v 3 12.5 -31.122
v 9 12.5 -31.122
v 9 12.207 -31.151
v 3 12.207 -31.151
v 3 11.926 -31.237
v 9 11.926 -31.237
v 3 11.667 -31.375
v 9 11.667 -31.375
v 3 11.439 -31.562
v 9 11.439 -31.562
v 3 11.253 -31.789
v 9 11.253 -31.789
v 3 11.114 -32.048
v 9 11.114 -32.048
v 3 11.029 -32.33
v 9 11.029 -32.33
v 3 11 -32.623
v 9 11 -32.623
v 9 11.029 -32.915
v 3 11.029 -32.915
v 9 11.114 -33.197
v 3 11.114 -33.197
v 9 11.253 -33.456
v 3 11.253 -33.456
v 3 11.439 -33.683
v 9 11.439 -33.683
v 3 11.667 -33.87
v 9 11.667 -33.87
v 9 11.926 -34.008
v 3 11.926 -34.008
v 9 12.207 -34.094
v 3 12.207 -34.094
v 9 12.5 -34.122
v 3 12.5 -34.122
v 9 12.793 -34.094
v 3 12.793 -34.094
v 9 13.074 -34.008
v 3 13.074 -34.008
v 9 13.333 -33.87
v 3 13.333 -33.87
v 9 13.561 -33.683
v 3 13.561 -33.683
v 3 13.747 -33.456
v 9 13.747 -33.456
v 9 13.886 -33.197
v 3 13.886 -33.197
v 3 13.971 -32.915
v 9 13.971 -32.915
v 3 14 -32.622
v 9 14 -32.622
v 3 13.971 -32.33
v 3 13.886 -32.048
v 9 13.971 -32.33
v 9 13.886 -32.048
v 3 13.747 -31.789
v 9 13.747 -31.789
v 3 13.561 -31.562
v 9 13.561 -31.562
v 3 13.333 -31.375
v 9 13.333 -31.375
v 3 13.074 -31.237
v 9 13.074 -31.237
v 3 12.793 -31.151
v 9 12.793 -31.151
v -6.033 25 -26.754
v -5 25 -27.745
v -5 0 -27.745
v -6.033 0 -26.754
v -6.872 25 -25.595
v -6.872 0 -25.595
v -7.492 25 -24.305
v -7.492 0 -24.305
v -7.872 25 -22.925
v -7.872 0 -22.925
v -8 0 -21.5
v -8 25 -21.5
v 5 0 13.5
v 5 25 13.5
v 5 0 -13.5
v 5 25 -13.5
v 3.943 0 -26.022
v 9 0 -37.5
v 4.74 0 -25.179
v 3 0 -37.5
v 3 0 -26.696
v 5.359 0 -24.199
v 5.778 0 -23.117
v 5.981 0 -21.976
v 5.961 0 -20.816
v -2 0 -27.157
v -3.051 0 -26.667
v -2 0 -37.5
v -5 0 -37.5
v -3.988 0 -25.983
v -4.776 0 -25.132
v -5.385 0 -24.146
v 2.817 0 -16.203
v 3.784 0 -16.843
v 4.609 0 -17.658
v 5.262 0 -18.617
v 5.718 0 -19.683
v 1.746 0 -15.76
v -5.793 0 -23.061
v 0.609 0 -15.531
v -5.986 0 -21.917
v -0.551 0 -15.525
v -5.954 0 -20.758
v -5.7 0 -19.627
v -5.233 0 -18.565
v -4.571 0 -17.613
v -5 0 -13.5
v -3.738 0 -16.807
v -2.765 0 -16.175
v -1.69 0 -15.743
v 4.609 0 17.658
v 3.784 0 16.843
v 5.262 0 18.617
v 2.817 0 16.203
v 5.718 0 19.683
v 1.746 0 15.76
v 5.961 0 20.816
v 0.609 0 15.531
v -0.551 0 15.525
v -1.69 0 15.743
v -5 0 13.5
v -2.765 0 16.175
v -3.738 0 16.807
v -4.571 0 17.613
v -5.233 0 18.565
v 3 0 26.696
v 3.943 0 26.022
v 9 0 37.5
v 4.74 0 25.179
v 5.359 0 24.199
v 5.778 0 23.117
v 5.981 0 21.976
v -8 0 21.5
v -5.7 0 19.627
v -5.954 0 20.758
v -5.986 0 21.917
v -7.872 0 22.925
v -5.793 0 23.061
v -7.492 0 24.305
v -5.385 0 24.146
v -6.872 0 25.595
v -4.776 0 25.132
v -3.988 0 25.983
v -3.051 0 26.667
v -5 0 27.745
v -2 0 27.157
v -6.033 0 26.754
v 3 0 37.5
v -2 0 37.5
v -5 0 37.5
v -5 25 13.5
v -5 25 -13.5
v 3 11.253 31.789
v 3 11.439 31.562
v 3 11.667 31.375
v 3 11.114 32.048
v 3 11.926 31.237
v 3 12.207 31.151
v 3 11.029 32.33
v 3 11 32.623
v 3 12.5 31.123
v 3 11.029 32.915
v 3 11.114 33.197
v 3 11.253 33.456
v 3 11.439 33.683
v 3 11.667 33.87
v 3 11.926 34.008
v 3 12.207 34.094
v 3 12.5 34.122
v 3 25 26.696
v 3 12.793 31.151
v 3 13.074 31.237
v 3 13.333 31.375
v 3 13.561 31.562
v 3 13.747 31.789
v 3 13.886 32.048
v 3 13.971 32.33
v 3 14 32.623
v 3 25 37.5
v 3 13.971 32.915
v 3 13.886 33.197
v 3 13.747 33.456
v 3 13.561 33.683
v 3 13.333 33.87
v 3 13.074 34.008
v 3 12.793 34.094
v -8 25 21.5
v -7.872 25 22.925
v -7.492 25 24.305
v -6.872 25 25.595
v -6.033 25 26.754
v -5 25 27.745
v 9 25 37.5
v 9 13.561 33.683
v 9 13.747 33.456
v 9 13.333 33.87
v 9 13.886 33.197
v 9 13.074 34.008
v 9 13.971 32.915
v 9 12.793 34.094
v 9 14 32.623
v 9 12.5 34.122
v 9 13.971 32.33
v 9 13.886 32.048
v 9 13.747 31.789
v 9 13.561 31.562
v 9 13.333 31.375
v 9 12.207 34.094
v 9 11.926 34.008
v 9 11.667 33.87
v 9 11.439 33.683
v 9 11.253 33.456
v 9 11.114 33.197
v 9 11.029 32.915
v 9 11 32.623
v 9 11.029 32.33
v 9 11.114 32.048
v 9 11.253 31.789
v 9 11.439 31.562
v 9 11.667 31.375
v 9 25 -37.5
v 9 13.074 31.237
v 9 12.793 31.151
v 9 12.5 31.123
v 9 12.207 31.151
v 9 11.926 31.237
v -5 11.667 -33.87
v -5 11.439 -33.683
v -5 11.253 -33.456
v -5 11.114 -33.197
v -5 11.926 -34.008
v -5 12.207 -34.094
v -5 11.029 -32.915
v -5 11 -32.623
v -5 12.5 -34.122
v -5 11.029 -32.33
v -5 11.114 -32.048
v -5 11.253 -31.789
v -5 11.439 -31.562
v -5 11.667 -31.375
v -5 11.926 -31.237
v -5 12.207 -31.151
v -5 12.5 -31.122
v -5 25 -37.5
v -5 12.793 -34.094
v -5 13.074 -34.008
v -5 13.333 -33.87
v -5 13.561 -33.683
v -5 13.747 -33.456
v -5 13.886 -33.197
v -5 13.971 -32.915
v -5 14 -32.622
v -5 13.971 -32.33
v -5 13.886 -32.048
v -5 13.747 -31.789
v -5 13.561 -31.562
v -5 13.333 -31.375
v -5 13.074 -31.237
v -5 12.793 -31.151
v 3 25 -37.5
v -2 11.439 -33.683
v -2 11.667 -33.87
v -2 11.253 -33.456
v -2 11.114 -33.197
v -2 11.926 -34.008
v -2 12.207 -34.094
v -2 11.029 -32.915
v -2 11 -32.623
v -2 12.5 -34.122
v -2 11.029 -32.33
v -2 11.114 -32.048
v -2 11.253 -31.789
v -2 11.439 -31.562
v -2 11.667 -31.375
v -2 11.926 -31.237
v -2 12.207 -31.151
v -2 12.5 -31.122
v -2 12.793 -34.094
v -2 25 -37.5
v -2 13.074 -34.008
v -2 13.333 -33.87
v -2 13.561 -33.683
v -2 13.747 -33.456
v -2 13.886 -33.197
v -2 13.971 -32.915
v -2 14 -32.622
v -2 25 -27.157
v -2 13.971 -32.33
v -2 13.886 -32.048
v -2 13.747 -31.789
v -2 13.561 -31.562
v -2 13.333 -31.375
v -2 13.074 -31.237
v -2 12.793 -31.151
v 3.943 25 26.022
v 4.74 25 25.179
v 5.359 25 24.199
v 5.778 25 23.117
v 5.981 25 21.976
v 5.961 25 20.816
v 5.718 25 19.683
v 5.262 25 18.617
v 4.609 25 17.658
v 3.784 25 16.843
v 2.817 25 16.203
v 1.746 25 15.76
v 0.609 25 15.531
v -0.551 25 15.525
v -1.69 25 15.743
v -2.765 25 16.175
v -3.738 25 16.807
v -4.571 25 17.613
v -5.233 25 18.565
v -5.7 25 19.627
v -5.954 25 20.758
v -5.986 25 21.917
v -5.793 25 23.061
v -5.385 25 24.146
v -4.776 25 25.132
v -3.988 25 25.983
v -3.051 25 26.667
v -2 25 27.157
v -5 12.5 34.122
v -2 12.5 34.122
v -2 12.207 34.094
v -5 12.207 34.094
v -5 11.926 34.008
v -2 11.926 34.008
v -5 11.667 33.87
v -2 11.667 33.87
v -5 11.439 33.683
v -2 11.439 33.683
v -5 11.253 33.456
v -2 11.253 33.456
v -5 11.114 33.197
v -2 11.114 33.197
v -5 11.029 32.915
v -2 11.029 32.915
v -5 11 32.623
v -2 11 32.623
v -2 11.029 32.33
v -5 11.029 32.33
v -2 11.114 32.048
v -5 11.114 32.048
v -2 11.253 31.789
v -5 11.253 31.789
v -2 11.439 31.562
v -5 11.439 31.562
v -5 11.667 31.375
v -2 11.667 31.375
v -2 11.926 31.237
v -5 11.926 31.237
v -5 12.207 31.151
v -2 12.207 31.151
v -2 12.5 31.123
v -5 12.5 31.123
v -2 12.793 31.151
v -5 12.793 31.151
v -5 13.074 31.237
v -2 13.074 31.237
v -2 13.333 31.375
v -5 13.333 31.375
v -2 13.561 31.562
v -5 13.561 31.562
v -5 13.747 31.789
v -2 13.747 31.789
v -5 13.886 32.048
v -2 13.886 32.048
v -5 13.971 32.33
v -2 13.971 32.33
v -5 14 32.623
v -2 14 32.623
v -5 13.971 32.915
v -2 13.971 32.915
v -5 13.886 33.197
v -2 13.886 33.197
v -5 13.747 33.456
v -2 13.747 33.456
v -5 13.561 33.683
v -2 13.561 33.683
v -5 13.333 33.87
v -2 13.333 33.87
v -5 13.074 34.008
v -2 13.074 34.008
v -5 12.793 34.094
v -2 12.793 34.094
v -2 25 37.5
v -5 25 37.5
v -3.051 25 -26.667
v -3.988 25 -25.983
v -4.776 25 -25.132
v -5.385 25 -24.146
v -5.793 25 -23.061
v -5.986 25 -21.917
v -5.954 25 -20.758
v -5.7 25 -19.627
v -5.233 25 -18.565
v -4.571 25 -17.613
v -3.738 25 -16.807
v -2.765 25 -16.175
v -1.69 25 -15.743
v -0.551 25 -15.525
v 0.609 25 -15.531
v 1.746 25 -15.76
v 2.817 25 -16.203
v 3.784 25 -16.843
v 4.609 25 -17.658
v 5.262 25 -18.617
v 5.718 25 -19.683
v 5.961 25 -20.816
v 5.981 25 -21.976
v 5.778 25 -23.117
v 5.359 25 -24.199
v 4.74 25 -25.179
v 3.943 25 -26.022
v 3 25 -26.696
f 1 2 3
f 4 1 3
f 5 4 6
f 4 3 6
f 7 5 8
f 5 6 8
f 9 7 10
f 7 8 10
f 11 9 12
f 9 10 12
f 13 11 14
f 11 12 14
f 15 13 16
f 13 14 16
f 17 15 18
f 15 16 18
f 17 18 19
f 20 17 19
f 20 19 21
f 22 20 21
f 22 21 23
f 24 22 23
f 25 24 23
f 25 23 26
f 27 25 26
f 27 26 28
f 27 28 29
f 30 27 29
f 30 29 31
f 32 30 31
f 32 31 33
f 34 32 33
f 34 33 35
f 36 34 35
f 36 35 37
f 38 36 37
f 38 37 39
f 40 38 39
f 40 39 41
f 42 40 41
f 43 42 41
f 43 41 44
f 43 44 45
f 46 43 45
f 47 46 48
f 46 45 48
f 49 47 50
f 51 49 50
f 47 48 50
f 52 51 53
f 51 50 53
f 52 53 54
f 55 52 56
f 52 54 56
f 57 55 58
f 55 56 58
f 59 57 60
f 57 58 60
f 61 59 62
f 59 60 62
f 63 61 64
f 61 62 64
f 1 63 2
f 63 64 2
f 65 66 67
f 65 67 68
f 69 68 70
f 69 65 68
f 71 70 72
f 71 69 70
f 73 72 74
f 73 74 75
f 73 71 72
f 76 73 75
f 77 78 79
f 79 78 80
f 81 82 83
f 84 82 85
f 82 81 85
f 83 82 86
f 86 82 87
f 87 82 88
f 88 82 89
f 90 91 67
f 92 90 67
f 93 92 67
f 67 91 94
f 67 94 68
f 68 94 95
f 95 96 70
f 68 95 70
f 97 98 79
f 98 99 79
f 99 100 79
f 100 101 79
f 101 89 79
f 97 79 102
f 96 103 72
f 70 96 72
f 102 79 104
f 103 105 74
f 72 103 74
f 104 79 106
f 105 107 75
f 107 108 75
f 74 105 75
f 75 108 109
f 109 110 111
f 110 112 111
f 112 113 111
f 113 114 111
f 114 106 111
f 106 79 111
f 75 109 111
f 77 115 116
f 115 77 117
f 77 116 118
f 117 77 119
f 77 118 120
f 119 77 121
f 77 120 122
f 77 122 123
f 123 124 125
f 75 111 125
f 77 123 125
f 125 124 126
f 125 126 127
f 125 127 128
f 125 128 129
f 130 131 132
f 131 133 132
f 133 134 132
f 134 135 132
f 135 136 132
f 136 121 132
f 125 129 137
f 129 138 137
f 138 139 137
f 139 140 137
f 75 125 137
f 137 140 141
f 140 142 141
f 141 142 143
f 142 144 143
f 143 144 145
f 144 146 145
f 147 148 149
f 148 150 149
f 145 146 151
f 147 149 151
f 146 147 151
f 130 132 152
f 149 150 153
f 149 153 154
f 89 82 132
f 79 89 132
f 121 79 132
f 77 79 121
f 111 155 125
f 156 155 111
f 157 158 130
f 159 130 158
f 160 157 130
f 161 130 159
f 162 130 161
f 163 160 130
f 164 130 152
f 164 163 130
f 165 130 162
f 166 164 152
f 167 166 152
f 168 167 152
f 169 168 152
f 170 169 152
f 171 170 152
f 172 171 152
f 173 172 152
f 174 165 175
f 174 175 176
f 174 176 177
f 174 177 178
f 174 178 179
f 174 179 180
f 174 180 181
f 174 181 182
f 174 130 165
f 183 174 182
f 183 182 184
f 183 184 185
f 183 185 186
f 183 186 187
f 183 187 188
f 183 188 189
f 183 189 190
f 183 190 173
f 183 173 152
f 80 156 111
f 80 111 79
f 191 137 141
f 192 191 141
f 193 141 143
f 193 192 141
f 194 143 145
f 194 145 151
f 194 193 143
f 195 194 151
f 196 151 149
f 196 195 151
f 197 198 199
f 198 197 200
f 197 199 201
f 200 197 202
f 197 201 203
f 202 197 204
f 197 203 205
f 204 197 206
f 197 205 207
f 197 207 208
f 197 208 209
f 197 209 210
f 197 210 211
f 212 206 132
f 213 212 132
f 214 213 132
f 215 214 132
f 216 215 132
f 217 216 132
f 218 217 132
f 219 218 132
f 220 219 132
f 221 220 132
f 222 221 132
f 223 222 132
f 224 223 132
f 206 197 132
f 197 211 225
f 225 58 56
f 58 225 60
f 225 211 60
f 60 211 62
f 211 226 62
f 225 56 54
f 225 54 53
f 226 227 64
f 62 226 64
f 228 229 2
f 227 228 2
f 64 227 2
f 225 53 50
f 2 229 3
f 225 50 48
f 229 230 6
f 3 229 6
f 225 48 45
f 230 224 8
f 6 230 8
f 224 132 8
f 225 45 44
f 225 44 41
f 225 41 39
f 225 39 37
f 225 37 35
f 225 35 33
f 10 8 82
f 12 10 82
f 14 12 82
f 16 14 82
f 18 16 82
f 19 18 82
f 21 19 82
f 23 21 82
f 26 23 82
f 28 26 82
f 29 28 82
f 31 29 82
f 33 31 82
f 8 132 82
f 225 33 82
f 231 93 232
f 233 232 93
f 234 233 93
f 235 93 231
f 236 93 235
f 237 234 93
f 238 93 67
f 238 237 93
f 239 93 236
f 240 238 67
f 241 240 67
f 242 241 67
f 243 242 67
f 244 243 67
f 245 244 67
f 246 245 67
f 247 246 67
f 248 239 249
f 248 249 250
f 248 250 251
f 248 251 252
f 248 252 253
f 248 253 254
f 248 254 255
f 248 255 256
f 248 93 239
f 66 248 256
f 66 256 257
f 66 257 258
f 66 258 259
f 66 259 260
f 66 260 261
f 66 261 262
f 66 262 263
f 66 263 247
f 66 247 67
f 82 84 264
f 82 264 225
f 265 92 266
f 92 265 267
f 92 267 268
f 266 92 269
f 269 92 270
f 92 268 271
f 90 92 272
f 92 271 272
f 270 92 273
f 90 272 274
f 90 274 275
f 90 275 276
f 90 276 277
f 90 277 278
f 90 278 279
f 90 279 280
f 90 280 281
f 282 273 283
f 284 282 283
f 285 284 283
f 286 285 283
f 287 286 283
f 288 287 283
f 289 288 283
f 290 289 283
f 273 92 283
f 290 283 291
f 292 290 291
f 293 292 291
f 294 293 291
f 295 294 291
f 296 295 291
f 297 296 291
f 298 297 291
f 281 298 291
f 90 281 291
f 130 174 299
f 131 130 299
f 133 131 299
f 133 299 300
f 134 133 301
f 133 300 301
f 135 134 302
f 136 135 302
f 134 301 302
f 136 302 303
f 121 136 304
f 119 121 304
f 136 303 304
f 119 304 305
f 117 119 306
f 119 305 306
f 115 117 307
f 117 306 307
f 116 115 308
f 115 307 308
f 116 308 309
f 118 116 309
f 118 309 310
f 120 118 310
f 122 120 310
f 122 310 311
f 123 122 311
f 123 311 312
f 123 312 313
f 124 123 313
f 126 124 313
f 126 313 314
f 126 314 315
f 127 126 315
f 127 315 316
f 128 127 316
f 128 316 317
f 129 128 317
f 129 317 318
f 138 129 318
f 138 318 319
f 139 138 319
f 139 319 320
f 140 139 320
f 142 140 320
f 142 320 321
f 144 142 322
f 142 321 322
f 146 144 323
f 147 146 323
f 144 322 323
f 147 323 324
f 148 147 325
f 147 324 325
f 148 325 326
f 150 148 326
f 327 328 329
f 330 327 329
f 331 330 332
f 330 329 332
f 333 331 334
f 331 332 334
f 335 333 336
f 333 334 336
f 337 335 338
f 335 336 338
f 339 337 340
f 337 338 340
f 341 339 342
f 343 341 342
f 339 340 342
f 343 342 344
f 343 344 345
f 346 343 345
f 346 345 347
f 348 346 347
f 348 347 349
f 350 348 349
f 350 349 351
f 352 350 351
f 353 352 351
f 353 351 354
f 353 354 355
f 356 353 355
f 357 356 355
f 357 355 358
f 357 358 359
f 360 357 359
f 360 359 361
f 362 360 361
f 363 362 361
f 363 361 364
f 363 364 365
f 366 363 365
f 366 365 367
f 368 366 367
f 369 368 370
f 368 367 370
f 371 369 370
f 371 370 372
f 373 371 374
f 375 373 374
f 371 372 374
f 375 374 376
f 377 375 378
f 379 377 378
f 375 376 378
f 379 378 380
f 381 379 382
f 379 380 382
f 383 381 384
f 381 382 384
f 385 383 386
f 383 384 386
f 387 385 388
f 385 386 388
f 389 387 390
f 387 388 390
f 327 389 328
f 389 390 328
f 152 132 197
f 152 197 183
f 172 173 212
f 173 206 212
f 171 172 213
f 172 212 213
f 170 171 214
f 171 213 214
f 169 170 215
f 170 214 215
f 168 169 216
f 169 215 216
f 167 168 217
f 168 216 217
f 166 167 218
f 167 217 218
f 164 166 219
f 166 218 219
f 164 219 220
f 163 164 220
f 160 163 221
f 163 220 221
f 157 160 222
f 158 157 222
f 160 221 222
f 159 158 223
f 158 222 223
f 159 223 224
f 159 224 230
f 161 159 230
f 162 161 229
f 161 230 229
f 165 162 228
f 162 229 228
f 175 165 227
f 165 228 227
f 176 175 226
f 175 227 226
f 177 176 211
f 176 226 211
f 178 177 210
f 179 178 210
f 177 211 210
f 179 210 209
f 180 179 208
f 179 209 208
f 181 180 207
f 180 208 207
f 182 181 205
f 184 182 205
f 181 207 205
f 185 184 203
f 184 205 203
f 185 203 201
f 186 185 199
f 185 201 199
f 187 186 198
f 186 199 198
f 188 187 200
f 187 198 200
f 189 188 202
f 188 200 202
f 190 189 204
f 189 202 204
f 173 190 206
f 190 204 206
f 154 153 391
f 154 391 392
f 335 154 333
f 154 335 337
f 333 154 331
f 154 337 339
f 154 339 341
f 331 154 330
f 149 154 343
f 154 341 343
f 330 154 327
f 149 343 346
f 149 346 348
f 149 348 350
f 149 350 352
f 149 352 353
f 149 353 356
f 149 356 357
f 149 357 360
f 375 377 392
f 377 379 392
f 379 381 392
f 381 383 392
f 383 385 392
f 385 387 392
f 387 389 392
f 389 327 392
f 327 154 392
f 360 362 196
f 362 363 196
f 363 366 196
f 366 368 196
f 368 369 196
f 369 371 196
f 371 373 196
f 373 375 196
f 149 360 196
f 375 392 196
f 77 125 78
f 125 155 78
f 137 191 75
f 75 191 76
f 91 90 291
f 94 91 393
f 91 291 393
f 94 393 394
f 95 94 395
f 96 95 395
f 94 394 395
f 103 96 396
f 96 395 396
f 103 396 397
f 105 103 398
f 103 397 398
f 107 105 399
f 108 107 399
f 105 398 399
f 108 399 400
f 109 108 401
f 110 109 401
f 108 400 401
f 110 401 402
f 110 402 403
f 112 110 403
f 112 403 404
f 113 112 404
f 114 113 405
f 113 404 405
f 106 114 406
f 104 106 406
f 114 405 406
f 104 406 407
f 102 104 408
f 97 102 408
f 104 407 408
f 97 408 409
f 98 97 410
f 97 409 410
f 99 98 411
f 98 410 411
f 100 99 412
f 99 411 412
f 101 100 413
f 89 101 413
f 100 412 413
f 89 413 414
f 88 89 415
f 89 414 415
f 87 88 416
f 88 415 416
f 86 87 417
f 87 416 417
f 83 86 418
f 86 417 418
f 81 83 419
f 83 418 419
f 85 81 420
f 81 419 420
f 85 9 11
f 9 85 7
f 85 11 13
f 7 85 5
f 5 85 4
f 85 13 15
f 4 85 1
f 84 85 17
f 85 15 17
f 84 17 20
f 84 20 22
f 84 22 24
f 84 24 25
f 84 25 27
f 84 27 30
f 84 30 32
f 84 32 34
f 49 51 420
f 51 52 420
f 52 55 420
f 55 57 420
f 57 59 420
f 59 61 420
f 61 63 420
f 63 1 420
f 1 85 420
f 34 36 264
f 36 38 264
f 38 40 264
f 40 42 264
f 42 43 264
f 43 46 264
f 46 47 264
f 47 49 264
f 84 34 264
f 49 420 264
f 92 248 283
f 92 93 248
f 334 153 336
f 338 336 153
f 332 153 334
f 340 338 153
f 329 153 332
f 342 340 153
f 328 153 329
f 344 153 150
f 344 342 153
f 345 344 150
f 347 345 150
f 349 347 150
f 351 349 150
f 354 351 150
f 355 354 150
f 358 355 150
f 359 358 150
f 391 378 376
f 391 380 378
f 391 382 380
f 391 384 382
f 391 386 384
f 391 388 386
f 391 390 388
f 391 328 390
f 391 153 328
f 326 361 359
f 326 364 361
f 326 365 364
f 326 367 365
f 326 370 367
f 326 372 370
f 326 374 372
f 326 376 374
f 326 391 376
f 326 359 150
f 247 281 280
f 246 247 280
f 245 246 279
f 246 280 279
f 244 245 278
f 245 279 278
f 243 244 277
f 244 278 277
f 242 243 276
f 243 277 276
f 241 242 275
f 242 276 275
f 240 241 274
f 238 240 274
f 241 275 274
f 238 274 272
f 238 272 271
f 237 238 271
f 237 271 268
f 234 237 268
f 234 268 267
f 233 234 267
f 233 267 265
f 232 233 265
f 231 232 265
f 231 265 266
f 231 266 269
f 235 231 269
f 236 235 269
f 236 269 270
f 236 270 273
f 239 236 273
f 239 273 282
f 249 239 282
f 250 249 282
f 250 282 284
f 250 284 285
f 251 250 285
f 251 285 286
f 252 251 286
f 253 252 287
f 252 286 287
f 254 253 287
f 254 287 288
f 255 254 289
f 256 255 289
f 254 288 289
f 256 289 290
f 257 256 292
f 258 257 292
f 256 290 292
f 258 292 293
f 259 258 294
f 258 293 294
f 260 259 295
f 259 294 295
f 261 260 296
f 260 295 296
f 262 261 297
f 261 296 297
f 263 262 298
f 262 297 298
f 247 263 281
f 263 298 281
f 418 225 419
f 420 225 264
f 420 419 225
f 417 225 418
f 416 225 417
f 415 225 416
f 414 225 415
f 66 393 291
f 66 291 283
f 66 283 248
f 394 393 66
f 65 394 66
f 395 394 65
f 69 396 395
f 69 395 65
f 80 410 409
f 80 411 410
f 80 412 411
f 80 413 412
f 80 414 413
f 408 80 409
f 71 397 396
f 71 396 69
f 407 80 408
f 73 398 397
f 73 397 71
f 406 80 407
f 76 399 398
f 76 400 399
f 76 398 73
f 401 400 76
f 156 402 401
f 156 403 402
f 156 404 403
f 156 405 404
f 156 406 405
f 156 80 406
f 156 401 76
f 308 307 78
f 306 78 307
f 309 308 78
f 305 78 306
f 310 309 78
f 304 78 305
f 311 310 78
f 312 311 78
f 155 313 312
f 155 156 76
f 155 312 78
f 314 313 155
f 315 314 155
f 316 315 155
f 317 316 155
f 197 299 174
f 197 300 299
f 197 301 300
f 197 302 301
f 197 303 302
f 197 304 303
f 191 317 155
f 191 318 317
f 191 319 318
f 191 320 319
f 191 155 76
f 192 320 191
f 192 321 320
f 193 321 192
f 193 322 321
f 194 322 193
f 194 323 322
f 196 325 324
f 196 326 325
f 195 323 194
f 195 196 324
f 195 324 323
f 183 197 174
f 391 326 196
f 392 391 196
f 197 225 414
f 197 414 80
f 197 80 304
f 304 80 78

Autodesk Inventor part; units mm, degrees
ref_plane "YZ Plane" through (0, 0, 0) normal (1, 0, 0) x (0, 1, 0)
ref_plane "XZ Plane" through (0, 0, 0) normal (0, 1, 0) x (-1, 0, 0)
ref_plane "XY Plane" through (0, 0, 0) normal (0, 0, 1) x (1, 0, 0)
sketch "Boceto2" plane through (0, 0, 0) normal (0, 1, 0) x (-1, 0, 0)
  line L0 (-10, 37.5) -> (10, 37.5)
  line L1 (10, 37.5) -> (10, -37.5)
  line L2 (10, -37.5) -> (-10, -37.5)
  line L3 (-10, -37.5) -> (-10, 37.5)
  line L4 (-10, 37.5) -> (10, -37.5) construction
  line L5 (10, 37.5) -> (-10, -37.5) construction
  point P0 (0, 0)
  dimension "d10" = 20
  dimension "d11" = 75
extrude "Extrusión1" add sketch "Boceto2" along normal blind 25
sketch "Boceto3" plane through (0, 25, 0) normal (0, 1, 0) x (1, 0, 0)
  line L0 (-10, -37.5) -> (10, -37.5) projected
  line L1 (10, -37.5) -> (10, 37.5) projected
  line L2 (10, 37.5) -> (-10, 37.5) projected
  line L3 (-10, 37.5) -> (-10, -37.5) projected
  arc A0 (3, -26.6962) -> (-2, -27.1569) centre (0, -21.5) ccw
  arc A1 (-8, -21.5) -> (-5, -27.745) centre (0, -21.5) ccw
  line L4 (-10, -37.5) -> (10, -37.5) projected
  line L5 (3, -37.5) -> (-2, -37.5)
  line L6 (3, -26.6962) -> (3, -37.5)
  line L7 (-5, -37.5) -> (-5, -27.745)
  line L8 (-8, -21.5) -> (-8, 21.5)
  line L9 (-5, -13.5) -> (5, -13.5)
  line L10 (-5, -13.5) -> (-5, 13.5)
  line L11 (7, 0) -> (10, 0)
  line L12 (-2, -37.5) -> (-2, -27.1569)
  line L13 (10, 0) -> (7, 0)
  arc A2 (-2, 27.1569) -> (3, 26.6962) centre (0, 21.5) ccw
  arc A3 (-5, 27.745) -> (-8, 21.5) centre (0, 21.5) ccw
  line L14 (3, 37.5) -> (-2, 37.5)
  line L15 (3, 26.6962) -> (3, 37.5)
  line L16 (-5, 37.5) -> (-5, 27.745)
  line L17 (-8, 21.5) -> (-8, 10)
  line L18 (-5, 13.5) -> (5, 13.5)
  line L19 (-5, 13.5) -> (-5, 10)
  line L20 (-2, 37.5) -> (-2, 27.1569)
  line L21 (5, -13.5) -> (5, 13.5)
  line L22 (-5, -37.5) -> (-10, -37.5)
  line L23 (-10, -37.5) -> (-10, 37.5)
  line L24 (10, 37.5) -> (-10, 37.5) projected
  line L25 (-10, 37.5) -> (-5, 37.5)
  point P0 (0, 0)
  point P1 (-8, -10)
  point P2 (-5, -10)
  dimension "d15" = 0
  dimension "d16" = 21.5
  dimension "d27" = 5
  dimension "d30" = 3
  dimension "d54" = 2
  dimension "d55" = 5
  dimension "d56" = 6
  dimension "d57" = 2
  dimension "d58" = 7
  dimension "d59" = 10
extrude "Extrusión3" cut sketch "Boceto3" against normal through all contours L12 A0 L6 L0 | L2 L15 A2 L20
extrude "Extrusión5" cut sketch "Boceto3" against normal through all contours L3 L2 L16 A3 L8 A1 L7 L0 | L10 L18 L21 L9
sketch "Boceto4" plane through (-8, 25, -21.5) normal (-1, 0, 0) x (0, 0, 1)
  line L0 (59, -25) -> (49.245, -25) projected
  line L1 (59, 0) -> (59, -25) projected
  line L2 (49.245, 0) -> (59, 0) projected
  line L3 (49.245, 0) -> (49.245, -25) projected
  line L4 (43, -25) -> (0, -25) projected
  line L5 (43, 0) -> (43, -25) projected
  line L6 (0, 0) -> (43, 0) projected
  line L7 (0, 0) -> (0, -25) projected
  line L8 (21.5, 0) -> (21.5, -25)
  line L9 (54.1225, -25) -> (54.1225, 0)
  line L10 (59, -12.5) -> (49.245, -12.5)
  point P0 (54.1225, -12.5)
  point P1 (54.1225, -12.5)
  point P2 (-11.1225, -12.5)
hole "Agujero1" at (-8, 12.5, 32.6225) at (-8, 12.5, -32.6225) direction (1, 0, 0) diameter 3 end through all
sketch "Boceto5" plane through (0, 0, 0) normal (0, -1, 0) x (1, 0, 0)
  line L0 (-5, -27.745) -> (-5, -37.5) projected
  line L1 (-5, -37.5) -> (-2, -37.5) projected
  line L2 (-2, -37.5) -> (-2, -27.1569) projected
  arc A0 (3, -26.6962) -> (-2, -27.1569) centre (0, -21.5) ccw projected
  line L3 (3, -26.6962) -> (3, -37.5) projected
  line L4 (3, -37.5) -> (10, -37.5) projected
  line L5 (10, -37.5) -> (10, 37.5) projected
  line L6 (10, 37.5) -> (3, 37.5) projected
  line L7 (3, 37.5) -> (3, 26.6962) projected
  arc A1 (-2, 27.1569) -> (3, 26.6962) centre (0, 21.5) ccw projected
  line L8 (-2, 27.1569) -> (-2, 37.5) projected
  line L9 (-2, 37.5) -> (-5, 37.5) projected
  line L10 (-5, 37.5) -> (-5, 27.745) projected
  arc A2 (-5, 27.745) -> (-8, 21.5) centre (0, 21.5) ccw projected
  line L11 (-8, 21.5) -> (-8, -21.5) projected
  arc A3 (-8, -21.5) -> (-5, -27.745) centre (0, -21.5) ccw projected
  line L12 (5, 13.5) -> (5, -13.5) projected
  line L13 (5, -13.5) -> (-5, -13.5) projected
  line L14 (-5, -13.5) -> (-5, 13.5) projected
  line L15 (-5, 13.5) -> (5, 13.5) projected
  line L16 (6, -21.5) -> (6, 21.5)
  arc A4 (-2, 27.1569) -> (3, 26.6962) centre (0, 21.5) ccw projected
  arc A5 (3, -26.6962) -> (-2, -27.1569) centre (0, -21.5) ccw projected
  line L17 (9, 37.5) -> (9, -37.5)
  point P0 (0, 0)
  dimension "d60" = 3
extrude "Extrusión6" cut sketch "Boceto5" against normal through all contours L17 L6 L5 L4
equation "\"d10\" = 20 * scale"
equation "\"d11\" = 75 * scale"
equation "\"d12\" = 25 * scale"
equation "\"d16\" = 21.5 * scale"
equation "\"d27\" = 5 * scale"
equation "\"d30\" = 3 * scale"
equation "\"d54\" = 2 * scale"
equation "\"d55\" = 5 * scale"
equation "\"d56\" = 6 * scale"
equation "\"d57\" = 2 * scale"
equation "\"d58\" = 7 * scale"
equation "\"d59\" = 10 * scale"
equation "\"scale\" = 1"
properties part number "PiezaPeluda"
